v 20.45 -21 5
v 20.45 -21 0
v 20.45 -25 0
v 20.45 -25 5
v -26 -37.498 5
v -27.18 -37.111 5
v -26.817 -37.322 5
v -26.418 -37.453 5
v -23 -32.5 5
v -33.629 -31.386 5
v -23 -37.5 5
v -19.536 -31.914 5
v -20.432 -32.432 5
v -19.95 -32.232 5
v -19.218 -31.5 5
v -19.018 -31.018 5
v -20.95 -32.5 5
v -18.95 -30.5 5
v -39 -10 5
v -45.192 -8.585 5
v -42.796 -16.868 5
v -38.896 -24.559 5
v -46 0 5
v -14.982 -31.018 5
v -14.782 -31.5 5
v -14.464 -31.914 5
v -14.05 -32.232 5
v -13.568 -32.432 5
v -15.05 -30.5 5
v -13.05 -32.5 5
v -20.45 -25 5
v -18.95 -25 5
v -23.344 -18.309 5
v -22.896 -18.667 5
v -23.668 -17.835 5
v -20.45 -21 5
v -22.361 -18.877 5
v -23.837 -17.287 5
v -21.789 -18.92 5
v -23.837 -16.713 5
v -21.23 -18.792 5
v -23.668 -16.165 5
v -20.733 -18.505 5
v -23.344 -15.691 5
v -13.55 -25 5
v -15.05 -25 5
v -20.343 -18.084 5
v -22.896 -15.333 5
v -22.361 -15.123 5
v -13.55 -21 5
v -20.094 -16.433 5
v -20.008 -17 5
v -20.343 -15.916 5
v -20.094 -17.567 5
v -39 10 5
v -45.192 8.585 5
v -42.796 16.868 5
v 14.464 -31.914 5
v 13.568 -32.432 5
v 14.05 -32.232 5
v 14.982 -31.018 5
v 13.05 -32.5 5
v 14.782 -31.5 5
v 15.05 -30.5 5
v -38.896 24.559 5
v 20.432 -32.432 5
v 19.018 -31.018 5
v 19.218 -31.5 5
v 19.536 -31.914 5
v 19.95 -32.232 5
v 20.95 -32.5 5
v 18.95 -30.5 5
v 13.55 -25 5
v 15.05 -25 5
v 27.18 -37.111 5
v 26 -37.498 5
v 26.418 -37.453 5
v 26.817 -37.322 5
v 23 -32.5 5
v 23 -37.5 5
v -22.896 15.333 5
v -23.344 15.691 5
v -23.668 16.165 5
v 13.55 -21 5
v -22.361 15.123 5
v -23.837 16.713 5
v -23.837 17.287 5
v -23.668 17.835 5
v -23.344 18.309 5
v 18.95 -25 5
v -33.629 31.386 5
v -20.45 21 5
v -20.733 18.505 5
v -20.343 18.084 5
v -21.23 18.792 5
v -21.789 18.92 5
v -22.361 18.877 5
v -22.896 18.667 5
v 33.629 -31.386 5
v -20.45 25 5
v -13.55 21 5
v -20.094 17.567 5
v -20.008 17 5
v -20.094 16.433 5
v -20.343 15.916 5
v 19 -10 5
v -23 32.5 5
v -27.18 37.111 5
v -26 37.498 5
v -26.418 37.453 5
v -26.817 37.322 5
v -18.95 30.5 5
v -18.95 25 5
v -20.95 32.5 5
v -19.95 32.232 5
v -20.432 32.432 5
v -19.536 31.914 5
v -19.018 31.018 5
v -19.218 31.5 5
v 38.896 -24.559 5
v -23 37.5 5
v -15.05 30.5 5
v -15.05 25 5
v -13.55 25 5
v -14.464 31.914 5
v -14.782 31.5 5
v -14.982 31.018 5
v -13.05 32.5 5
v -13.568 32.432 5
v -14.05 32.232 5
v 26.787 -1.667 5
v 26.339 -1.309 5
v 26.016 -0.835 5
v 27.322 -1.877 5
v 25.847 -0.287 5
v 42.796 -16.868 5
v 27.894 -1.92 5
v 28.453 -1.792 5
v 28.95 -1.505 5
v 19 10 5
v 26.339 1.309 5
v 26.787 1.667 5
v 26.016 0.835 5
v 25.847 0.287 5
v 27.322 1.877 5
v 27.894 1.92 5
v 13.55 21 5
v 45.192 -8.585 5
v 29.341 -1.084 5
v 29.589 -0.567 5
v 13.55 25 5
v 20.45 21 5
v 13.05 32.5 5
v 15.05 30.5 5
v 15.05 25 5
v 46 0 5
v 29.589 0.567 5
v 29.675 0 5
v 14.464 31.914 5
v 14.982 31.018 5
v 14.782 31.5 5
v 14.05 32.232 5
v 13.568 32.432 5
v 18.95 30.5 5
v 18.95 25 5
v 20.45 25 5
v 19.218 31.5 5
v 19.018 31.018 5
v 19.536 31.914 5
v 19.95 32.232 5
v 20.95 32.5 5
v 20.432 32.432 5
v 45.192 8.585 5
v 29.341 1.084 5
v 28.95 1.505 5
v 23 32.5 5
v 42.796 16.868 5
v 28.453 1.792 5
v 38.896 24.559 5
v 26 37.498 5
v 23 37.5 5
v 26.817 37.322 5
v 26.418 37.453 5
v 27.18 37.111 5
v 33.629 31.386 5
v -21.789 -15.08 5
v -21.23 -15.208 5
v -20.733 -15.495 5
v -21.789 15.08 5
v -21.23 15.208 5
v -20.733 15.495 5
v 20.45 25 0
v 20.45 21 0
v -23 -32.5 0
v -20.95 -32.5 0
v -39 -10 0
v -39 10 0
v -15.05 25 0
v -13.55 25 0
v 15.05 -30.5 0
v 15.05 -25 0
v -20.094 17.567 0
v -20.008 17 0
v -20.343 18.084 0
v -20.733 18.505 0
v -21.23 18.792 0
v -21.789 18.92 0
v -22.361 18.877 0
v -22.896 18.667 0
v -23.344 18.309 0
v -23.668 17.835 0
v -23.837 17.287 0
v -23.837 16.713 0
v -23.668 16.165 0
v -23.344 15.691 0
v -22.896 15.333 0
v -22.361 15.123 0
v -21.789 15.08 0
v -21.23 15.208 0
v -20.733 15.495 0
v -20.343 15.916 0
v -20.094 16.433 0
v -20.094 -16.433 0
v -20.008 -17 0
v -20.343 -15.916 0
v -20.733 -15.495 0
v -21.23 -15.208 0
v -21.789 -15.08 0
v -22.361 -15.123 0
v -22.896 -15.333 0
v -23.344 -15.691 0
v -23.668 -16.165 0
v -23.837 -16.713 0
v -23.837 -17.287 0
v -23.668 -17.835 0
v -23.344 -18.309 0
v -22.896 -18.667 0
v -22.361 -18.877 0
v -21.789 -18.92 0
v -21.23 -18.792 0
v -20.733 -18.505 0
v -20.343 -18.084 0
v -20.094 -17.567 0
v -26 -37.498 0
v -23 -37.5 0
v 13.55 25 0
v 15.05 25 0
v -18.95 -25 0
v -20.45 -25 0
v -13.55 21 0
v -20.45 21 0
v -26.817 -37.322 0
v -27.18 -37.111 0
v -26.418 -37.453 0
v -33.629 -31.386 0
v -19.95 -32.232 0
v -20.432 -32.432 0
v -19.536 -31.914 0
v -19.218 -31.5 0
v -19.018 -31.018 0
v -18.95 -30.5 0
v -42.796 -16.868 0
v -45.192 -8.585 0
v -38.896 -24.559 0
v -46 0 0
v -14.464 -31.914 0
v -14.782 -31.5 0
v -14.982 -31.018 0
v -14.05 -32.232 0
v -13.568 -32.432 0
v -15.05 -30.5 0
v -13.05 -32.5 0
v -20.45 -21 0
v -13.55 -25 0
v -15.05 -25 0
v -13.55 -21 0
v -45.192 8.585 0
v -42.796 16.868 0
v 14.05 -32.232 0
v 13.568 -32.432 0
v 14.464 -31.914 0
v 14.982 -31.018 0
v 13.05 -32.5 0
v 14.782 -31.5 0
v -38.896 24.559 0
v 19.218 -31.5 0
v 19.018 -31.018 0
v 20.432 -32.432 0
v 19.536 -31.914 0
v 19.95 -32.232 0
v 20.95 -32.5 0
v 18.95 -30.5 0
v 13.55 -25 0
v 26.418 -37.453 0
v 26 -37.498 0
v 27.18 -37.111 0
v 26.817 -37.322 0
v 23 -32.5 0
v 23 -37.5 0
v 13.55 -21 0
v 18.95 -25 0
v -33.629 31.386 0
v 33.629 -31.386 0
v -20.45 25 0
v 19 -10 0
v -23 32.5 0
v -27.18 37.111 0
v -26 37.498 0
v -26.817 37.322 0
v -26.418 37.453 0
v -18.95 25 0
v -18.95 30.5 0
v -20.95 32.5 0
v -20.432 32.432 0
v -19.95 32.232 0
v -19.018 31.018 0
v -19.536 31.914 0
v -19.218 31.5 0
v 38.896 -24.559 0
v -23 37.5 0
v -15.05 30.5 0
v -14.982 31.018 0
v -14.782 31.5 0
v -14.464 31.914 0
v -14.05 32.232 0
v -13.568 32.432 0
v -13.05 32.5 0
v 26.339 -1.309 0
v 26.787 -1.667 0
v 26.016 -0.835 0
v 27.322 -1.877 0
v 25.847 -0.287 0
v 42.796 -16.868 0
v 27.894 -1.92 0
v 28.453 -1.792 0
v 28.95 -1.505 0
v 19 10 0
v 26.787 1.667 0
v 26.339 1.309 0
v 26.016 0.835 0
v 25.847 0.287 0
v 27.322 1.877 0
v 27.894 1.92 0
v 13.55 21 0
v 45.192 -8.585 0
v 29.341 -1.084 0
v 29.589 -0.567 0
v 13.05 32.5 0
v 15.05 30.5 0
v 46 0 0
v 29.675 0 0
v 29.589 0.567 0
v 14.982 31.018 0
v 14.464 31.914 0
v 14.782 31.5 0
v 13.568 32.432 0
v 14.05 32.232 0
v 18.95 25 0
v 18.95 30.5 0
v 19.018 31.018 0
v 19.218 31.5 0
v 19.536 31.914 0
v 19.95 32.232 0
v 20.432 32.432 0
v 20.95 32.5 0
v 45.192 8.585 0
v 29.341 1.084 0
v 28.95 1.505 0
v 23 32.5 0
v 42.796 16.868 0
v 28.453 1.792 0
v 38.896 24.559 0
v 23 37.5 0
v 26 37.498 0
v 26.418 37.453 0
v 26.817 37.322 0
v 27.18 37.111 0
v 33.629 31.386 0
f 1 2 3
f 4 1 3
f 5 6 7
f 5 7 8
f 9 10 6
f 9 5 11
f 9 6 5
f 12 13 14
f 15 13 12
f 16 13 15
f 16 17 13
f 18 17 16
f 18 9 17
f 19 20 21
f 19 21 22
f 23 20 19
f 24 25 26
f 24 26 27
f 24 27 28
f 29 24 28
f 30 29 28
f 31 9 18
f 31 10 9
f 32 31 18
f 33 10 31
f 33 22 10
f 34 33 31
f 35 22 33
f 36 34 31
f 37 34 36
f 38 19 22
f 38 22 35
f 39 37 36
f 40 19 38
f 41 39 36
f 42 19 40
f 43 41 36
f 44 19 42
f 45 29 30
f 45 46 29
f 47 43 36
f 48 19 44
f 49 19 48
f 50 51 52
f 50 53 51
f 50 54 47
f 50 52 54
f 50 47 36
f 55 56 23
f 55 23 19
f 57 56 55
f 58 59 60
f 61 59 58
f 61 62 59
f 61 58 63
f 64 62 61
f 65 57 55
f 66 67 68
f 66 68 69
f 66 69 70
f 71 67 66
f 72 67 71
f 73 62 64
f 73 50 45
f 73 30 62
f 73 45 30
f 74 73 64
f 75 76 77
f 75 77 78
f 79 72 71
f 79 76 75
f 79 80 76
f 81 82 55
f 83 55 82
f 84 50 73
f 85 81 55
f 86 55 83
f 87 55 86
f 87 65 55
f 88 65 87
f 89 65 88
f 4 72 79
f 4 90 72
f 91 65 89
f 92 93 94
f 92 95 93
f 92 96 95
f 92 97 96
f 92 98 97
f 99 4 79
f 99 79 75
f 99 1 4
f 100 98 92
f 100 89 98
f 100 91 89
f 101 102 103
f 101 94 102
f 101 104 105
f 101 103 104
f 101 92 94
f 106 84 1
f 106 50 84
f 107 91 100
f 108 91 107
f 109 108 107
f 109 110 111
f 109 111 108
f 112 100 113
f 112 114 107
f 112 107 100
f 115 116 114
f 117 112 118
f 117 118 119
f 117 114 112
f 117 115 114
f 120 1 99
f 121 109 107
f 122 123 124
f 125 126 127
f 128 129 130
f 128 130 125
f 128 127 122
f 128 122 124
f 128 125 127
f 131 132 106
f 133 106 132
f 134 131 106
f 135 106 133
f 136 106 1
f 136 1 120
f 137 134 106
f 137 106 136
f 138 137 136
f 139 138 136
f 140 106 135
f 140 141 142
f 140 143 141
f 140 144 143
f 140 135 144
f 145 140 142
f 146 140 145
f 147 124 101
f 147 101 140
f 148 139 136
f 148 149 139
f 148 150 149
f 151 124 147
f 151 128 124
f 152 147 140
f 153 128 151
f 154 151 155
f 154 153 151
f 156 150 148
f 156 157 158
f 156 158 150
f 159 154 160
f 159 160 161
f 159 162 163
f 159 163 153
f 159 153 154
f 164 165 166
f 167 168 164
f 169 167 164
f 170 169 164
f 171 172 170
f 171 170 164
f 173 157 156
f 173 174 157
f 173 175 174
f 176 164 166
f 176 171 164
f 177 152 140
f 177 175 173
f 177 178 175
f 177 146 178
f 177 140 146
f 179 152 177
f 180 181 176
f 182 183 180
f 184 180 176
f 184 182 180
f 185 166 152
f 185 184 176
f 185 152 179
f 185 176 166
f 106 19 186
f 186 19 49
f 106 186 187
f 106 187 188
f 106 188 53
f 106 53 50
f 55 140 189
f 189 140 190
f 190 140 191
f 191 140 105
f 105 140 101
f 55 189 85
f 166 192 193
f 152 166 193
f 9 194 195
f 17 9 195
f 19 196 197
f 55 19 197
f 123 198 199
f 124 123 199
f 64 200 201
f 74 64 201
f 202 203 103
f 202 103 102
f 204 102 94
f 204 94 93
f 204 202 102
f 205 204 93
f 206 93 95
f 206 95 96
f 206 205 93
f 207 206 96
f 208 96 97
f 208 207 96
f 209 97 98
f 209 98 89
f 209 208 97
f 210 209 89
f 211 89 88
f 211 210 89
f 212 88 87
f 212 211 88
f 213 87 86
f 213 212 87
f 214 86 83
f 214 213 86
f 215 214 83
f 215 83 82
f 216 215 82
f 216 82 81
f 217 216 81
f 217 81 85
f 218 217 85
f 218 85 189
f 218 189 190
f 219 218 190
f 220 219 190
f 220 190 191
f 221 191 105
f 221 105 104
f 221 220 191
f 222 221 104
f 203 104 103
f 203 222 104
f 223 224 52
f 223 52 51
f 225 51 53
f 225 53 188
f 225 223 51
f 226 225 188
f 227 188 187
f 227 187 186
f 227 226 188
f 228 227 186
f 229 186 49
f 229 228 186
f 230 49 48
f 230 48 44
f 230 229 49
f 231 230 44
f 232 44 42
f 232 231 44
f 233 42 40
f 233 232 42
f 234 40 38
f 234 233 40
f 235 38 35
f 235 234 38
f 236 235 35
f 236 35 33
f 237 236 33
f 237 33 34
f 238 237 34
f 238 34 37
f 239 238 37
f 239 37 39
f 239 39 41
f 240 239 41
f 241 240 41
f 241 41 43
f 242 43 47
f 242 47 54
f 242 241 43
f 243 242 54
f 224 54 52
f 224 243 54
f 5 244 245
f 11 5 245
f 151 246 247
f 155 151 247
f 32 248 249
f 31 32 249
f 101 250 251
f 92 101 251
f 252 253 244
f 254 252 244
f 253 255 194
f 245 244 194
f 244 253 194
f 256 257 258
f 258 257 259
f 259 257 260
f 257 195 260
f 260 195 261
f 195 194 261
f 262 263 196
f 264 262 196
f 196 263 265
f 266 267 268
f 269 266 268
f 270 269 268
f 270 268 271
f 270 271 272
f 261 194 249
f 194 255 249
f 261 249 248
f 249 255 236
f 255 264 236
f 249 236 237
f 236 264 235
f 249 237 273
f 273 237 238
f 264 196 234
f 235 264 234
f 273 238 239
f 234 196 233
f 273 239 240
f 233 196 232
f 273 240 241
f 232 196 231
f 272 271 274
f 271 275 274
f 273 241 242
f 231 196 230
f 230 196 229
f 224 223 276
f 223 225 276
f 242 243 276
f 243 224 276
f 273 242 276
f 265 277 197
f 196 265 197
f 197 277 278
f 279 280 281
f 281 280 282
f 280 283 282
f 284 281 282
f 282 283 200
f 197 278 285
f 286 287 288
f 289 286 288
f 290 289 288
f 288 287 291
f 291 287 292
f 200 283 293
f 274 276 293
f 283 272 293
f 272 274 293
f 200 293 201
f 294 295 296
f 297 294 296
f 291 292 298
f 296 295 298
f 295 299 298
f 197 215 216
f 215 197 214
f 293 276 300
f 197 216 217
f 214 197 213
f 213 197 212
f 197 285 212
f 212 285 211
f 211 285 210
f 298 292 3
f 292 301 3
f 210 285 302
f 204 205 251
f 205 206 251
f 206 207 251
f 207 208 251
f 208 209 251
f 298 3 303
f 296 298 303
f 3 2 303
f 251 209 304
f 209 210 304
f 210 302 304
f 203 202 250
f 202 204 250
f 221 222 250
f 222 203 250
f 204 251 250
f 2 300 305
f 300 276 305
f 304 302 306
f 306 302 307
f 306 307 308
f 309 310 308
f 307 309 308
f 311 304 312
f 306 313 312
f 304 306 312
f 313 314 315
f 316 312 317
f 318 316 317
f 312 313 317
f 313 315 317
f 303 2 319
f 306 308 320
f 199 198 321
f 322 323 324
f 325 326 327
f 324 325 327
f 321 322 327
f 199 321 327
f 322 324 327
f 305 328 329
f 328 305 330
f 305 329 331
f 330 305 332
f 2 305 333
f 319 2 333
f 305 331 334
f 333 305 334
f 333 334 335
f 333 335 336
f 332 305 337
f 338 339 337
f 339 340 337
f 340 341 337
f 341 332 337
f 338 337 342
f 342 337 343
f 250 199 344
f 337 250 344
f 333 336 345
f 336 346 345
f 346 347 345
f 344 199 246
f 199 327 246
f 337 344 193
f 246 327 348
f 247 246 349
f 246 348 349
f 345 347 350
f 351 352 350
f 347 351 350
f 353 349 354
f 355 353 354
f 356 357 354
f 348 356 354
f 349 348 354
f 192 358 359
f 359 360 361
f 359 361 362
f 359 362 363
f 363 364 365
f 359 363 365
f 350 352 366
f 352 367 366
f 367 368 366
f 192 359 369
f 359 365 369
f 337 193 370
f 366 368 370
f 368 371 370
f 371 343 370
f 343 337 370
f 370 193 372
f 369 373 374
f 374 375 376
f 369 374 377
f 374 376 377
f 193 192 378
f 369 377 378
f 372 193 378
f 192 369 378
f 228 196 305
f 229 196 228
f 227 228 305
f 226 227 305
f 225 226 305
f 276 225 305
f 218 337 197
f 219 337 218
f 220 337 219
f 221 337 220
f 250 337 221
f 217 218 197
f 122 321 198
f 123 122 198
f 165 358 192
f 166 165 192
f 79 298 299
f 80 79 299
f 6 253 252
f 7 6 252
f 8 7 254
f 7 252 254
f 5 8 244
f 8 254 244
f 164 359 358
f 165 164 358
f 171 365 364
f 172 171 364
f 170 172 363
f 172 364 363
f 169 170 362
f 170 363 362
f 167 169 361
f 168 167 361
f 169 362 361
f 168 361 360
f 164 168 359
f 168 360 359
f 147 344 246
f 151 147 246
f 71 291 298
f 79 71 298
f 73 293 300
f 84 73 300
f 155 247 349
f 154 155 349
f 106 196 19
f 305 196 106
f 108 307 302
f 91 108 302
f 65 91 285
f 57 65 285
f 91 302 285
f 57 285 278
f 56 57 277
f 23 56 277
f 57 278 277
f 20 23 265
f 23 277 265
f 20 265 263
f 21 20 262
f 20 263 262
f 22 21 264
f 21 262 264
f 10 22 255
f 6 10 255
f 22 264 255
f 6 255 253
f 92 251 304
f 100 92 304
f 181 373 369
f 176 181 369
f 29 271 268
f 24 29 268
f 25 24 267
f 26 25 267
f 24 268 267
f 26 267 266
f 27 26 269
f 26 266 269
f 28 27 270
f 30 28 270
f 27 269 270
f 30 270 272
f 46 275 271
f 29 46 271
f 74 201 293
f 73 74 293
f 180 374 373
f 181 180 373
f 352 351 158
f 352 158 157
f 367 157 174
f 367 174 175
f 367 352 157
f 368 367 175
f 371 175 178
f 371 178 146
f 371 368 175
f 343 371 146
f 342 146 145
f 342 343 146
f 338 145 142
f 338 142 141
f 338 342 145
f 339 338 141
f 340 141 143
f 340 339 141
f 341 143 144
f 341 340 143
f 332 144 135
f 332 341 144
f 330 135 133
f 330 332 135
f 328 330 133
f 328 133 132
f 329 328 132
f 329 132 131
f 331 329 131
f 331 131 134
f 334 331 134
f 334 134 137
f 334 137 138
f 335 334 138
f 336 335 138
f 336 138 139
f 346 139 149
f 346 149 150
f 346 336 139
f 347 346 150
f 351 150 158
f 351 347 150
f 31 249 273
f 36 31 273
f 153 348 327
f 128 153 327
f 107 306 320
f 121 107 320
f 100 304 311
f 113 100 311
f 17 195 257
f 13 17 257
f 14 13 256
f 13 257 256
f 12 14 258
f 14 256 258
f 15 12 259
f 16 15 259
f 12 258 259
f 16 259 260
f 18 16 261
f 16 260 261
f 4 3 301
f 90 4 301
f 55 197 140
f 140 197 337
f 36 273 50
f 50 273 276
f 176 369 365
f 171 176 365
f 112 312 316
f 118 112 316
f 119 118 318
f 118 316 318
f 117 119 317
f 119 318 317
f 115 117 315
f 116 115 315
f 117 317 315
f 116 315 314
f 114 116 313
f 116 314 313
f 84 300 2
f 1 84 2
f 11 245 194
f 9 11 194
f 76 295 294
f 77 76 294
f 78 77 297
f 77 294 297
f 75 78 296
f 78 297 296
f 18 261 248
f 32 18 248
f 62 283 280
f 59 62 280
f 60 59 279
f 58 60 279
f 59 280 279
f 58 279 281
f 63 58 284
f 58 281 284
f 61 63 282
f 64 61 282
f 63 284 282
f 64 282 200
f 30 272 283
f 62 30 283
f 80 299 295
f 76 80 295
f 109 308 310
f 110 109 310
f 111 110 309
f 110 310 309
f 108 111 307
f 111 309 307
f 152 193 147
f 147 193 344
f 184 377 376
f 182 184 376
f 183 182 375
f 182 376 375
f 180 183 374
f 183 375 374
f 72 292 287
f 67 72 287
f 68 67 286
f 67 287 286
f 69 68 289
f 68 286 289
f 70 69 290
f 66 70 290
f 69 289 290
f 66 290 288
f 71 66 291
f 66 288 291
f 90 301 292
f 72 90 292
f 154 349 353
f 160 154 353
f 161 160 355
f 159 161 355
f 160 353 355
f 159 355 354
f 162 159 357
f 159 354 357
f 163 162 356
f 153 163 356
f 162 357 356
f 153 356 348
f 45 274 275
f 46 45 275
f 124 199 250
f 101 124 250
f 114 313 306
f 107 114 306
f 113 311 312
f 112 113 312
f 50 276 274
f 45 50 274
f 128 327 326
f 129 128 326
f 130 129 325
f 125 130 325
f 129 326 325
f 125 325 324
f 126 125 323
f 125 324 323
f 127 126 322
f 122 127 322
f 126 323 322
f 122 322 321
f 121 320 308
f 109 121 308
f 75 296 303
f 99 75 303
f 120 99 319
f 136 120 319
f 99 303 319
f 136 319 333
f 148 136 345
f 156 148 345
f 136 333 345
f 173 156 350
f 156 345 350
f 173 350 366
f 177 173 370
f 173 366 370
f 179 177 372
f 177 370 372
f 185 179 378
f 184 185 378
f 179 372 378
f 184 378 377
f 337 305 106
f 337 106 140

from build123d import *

# Parameters (mm, degrees)
ESQUISSE1_R        = 1.925
ESQUISSE1_W        = 58
ESQUISSE1_H        = 20
BOSS_EXTRU_1_DEPTH = 5


with BuildPart() as part:
    # Esquisse1 → Boss.-Extru.1 (new body)
    with BuildSketch(Plane.XY):
        with BuildLine():
            Line((13.05, 32.5), (-13.05, 32.5))
            ThreePointArc((-13.05, 32.5), (-14.464213562, 31.914213562), (-15.05, 30.5))
            Line((-15.05, 30.5), (-15.05, 25))
            Line((-15.05, 25), (-13.55, 25))
            Line((-13.55, 25), (-13.55, 21))
            Line((-13.55, 21), (-20.45, 21))
            Line((-20.45, 21), (-20.45, 25))
            Line((-20.45, 25), (-18.95, 25))
            Line((-18.95, 25), (-18.95, 30.5))
            ThreePointArc((-18.95, 30.5), (-19.535786438, 31.914213562), (-20.95, 32.5))
            Line((-20.95, 32.5), (-23, 32.5))
            Line((-23, 32.5), (-23, 37.5))
            Line((-23, 37.5), (-25.999999067, 37.497633905))
            ThreePointArc((-25.999999067, 37.497633905), (-26.620839292, 37.398317642), (-27.180168114, 37.111163374))
            ThreePointArc((-27.180168114, 37.111163374), (-45.999999844, 0), (-27.180168114, -37.111163374))
            ThreePointArc((-27.180168114, -37.111163374), (-26.620839292, -37.398317642), (-25.999999067, -37.497633905))
            Line((-25.999999067, -37.497633905), (-23, -37.5))
            Line((-23, -37.5), (-23, -32.5))
            Line((-23, -32.5), (-20.95, -32.5))
            ThreePointArc((-20.95, -32.5), (-19.535786438, -31.914213562), (-18.95, -30.5))
            Line((-18.95, -30.5), (-18.95, -25))
            Line((-18.95, -25), (-20.45, -25))
            Line((-20.45, -25), (-20.45, -21))
            Line((-20.45, -21), (-13.55, -21))
            Line((-13.55, -21), (-13.55, -25))
            Line((-13.55, -25), (-15.05, -25))
            Line((-15.05, -25), (-15.05, -30.5))
            ThreePointArc((-15.05, -30.5), (-14.464213562, -31.914213562), (-13.05, -32.5))
            Line((-13.05, -32.5), (13.05, -32.5))
            ThreePointArc((13.05, -32.5), (14.464213562, -31.914213562), (15.05, -30.5))
            Line((15.05, -30.5), (15.05, -25))
            Line((15.05, -25), (13.55, -25))
            Line((13.55, -25), (13.55, -21))
            Line((13.55, -21), (20.45, -21))
            Line((20.45, -21), (20.45, -25))
            Line((20.45, -25), (18.95, -25))
            Line((18.95, -25), (18.95, -30.5))
            ThreePointArc((18.95, -30.5), (19.535786438, -31.914213562), (20.95, -32.5))
            Line((20.95, -32.5), (23, -32.5))
            Line((23, -32.5), (23, -37.5))
            Line((23, -37.5), (25.999999067, -37.497633905))
            ThreePointArc((25.999999067, -37.497633905), (26.620839292, -37.398317642), (27.180168114, -37.111163374))
            ThreePointArc((27.180168114, -37.111163374), (45.999999844, 0), (27.180168114, 37.111163374))
            ThreePointArc((27.180168114, 37.111163374), (26.620839292, 37.398317642), (25.999999067, 37.497633905))
            Line((25.999999067, 37.497633905), (23, 37.5))
            Line((23, 37.5), (23, 32.5))
            Line((23, 32.5), (20.95, 32.5))
            ThreePointArc((20.95, 32.5), (19.535786438, 31.914213562), (18.95, 30.5))
            Line((18.95, 30.5), (18.95, 25))
            Line((18.95, 25), (20.45, 25))
            Line((20.45, 25), (20.45, 21))
            Line((20.45, 21), (13.55, 21))
            Line((13.55, 21), (13.55, 25))
            Line((13.55, 25), (15.05, 25))
            Line((15.05, 25), (15.05, 30.5))
            ThreePointArc((15.05, 30.5), (14.464213562, 31.914213562), (13.05, 32.5))
        make_face()
        with Locations((27.75, 0)):
            Circle(ESQUISSE1_R, mode=Mode.SUBTRACT)
        with Locations((-21.933137835, -17)):
            Circle(ESQUISSE1_R, mode=Mode.SUBTRACT)
        with Locations((-21.933137835, 17)):
            Circle(ESQUISSE1_R, mode=Mode.SUBTRACT)
        with Locations((-10, 0)):
            Rectangle(ESQUISSE1_W, ESQUISSE1_H, mode=Mode.SUBTRACT)
    extrude(amount=BOSS_EXTRU_1_DEPTH)


solid = part.part
